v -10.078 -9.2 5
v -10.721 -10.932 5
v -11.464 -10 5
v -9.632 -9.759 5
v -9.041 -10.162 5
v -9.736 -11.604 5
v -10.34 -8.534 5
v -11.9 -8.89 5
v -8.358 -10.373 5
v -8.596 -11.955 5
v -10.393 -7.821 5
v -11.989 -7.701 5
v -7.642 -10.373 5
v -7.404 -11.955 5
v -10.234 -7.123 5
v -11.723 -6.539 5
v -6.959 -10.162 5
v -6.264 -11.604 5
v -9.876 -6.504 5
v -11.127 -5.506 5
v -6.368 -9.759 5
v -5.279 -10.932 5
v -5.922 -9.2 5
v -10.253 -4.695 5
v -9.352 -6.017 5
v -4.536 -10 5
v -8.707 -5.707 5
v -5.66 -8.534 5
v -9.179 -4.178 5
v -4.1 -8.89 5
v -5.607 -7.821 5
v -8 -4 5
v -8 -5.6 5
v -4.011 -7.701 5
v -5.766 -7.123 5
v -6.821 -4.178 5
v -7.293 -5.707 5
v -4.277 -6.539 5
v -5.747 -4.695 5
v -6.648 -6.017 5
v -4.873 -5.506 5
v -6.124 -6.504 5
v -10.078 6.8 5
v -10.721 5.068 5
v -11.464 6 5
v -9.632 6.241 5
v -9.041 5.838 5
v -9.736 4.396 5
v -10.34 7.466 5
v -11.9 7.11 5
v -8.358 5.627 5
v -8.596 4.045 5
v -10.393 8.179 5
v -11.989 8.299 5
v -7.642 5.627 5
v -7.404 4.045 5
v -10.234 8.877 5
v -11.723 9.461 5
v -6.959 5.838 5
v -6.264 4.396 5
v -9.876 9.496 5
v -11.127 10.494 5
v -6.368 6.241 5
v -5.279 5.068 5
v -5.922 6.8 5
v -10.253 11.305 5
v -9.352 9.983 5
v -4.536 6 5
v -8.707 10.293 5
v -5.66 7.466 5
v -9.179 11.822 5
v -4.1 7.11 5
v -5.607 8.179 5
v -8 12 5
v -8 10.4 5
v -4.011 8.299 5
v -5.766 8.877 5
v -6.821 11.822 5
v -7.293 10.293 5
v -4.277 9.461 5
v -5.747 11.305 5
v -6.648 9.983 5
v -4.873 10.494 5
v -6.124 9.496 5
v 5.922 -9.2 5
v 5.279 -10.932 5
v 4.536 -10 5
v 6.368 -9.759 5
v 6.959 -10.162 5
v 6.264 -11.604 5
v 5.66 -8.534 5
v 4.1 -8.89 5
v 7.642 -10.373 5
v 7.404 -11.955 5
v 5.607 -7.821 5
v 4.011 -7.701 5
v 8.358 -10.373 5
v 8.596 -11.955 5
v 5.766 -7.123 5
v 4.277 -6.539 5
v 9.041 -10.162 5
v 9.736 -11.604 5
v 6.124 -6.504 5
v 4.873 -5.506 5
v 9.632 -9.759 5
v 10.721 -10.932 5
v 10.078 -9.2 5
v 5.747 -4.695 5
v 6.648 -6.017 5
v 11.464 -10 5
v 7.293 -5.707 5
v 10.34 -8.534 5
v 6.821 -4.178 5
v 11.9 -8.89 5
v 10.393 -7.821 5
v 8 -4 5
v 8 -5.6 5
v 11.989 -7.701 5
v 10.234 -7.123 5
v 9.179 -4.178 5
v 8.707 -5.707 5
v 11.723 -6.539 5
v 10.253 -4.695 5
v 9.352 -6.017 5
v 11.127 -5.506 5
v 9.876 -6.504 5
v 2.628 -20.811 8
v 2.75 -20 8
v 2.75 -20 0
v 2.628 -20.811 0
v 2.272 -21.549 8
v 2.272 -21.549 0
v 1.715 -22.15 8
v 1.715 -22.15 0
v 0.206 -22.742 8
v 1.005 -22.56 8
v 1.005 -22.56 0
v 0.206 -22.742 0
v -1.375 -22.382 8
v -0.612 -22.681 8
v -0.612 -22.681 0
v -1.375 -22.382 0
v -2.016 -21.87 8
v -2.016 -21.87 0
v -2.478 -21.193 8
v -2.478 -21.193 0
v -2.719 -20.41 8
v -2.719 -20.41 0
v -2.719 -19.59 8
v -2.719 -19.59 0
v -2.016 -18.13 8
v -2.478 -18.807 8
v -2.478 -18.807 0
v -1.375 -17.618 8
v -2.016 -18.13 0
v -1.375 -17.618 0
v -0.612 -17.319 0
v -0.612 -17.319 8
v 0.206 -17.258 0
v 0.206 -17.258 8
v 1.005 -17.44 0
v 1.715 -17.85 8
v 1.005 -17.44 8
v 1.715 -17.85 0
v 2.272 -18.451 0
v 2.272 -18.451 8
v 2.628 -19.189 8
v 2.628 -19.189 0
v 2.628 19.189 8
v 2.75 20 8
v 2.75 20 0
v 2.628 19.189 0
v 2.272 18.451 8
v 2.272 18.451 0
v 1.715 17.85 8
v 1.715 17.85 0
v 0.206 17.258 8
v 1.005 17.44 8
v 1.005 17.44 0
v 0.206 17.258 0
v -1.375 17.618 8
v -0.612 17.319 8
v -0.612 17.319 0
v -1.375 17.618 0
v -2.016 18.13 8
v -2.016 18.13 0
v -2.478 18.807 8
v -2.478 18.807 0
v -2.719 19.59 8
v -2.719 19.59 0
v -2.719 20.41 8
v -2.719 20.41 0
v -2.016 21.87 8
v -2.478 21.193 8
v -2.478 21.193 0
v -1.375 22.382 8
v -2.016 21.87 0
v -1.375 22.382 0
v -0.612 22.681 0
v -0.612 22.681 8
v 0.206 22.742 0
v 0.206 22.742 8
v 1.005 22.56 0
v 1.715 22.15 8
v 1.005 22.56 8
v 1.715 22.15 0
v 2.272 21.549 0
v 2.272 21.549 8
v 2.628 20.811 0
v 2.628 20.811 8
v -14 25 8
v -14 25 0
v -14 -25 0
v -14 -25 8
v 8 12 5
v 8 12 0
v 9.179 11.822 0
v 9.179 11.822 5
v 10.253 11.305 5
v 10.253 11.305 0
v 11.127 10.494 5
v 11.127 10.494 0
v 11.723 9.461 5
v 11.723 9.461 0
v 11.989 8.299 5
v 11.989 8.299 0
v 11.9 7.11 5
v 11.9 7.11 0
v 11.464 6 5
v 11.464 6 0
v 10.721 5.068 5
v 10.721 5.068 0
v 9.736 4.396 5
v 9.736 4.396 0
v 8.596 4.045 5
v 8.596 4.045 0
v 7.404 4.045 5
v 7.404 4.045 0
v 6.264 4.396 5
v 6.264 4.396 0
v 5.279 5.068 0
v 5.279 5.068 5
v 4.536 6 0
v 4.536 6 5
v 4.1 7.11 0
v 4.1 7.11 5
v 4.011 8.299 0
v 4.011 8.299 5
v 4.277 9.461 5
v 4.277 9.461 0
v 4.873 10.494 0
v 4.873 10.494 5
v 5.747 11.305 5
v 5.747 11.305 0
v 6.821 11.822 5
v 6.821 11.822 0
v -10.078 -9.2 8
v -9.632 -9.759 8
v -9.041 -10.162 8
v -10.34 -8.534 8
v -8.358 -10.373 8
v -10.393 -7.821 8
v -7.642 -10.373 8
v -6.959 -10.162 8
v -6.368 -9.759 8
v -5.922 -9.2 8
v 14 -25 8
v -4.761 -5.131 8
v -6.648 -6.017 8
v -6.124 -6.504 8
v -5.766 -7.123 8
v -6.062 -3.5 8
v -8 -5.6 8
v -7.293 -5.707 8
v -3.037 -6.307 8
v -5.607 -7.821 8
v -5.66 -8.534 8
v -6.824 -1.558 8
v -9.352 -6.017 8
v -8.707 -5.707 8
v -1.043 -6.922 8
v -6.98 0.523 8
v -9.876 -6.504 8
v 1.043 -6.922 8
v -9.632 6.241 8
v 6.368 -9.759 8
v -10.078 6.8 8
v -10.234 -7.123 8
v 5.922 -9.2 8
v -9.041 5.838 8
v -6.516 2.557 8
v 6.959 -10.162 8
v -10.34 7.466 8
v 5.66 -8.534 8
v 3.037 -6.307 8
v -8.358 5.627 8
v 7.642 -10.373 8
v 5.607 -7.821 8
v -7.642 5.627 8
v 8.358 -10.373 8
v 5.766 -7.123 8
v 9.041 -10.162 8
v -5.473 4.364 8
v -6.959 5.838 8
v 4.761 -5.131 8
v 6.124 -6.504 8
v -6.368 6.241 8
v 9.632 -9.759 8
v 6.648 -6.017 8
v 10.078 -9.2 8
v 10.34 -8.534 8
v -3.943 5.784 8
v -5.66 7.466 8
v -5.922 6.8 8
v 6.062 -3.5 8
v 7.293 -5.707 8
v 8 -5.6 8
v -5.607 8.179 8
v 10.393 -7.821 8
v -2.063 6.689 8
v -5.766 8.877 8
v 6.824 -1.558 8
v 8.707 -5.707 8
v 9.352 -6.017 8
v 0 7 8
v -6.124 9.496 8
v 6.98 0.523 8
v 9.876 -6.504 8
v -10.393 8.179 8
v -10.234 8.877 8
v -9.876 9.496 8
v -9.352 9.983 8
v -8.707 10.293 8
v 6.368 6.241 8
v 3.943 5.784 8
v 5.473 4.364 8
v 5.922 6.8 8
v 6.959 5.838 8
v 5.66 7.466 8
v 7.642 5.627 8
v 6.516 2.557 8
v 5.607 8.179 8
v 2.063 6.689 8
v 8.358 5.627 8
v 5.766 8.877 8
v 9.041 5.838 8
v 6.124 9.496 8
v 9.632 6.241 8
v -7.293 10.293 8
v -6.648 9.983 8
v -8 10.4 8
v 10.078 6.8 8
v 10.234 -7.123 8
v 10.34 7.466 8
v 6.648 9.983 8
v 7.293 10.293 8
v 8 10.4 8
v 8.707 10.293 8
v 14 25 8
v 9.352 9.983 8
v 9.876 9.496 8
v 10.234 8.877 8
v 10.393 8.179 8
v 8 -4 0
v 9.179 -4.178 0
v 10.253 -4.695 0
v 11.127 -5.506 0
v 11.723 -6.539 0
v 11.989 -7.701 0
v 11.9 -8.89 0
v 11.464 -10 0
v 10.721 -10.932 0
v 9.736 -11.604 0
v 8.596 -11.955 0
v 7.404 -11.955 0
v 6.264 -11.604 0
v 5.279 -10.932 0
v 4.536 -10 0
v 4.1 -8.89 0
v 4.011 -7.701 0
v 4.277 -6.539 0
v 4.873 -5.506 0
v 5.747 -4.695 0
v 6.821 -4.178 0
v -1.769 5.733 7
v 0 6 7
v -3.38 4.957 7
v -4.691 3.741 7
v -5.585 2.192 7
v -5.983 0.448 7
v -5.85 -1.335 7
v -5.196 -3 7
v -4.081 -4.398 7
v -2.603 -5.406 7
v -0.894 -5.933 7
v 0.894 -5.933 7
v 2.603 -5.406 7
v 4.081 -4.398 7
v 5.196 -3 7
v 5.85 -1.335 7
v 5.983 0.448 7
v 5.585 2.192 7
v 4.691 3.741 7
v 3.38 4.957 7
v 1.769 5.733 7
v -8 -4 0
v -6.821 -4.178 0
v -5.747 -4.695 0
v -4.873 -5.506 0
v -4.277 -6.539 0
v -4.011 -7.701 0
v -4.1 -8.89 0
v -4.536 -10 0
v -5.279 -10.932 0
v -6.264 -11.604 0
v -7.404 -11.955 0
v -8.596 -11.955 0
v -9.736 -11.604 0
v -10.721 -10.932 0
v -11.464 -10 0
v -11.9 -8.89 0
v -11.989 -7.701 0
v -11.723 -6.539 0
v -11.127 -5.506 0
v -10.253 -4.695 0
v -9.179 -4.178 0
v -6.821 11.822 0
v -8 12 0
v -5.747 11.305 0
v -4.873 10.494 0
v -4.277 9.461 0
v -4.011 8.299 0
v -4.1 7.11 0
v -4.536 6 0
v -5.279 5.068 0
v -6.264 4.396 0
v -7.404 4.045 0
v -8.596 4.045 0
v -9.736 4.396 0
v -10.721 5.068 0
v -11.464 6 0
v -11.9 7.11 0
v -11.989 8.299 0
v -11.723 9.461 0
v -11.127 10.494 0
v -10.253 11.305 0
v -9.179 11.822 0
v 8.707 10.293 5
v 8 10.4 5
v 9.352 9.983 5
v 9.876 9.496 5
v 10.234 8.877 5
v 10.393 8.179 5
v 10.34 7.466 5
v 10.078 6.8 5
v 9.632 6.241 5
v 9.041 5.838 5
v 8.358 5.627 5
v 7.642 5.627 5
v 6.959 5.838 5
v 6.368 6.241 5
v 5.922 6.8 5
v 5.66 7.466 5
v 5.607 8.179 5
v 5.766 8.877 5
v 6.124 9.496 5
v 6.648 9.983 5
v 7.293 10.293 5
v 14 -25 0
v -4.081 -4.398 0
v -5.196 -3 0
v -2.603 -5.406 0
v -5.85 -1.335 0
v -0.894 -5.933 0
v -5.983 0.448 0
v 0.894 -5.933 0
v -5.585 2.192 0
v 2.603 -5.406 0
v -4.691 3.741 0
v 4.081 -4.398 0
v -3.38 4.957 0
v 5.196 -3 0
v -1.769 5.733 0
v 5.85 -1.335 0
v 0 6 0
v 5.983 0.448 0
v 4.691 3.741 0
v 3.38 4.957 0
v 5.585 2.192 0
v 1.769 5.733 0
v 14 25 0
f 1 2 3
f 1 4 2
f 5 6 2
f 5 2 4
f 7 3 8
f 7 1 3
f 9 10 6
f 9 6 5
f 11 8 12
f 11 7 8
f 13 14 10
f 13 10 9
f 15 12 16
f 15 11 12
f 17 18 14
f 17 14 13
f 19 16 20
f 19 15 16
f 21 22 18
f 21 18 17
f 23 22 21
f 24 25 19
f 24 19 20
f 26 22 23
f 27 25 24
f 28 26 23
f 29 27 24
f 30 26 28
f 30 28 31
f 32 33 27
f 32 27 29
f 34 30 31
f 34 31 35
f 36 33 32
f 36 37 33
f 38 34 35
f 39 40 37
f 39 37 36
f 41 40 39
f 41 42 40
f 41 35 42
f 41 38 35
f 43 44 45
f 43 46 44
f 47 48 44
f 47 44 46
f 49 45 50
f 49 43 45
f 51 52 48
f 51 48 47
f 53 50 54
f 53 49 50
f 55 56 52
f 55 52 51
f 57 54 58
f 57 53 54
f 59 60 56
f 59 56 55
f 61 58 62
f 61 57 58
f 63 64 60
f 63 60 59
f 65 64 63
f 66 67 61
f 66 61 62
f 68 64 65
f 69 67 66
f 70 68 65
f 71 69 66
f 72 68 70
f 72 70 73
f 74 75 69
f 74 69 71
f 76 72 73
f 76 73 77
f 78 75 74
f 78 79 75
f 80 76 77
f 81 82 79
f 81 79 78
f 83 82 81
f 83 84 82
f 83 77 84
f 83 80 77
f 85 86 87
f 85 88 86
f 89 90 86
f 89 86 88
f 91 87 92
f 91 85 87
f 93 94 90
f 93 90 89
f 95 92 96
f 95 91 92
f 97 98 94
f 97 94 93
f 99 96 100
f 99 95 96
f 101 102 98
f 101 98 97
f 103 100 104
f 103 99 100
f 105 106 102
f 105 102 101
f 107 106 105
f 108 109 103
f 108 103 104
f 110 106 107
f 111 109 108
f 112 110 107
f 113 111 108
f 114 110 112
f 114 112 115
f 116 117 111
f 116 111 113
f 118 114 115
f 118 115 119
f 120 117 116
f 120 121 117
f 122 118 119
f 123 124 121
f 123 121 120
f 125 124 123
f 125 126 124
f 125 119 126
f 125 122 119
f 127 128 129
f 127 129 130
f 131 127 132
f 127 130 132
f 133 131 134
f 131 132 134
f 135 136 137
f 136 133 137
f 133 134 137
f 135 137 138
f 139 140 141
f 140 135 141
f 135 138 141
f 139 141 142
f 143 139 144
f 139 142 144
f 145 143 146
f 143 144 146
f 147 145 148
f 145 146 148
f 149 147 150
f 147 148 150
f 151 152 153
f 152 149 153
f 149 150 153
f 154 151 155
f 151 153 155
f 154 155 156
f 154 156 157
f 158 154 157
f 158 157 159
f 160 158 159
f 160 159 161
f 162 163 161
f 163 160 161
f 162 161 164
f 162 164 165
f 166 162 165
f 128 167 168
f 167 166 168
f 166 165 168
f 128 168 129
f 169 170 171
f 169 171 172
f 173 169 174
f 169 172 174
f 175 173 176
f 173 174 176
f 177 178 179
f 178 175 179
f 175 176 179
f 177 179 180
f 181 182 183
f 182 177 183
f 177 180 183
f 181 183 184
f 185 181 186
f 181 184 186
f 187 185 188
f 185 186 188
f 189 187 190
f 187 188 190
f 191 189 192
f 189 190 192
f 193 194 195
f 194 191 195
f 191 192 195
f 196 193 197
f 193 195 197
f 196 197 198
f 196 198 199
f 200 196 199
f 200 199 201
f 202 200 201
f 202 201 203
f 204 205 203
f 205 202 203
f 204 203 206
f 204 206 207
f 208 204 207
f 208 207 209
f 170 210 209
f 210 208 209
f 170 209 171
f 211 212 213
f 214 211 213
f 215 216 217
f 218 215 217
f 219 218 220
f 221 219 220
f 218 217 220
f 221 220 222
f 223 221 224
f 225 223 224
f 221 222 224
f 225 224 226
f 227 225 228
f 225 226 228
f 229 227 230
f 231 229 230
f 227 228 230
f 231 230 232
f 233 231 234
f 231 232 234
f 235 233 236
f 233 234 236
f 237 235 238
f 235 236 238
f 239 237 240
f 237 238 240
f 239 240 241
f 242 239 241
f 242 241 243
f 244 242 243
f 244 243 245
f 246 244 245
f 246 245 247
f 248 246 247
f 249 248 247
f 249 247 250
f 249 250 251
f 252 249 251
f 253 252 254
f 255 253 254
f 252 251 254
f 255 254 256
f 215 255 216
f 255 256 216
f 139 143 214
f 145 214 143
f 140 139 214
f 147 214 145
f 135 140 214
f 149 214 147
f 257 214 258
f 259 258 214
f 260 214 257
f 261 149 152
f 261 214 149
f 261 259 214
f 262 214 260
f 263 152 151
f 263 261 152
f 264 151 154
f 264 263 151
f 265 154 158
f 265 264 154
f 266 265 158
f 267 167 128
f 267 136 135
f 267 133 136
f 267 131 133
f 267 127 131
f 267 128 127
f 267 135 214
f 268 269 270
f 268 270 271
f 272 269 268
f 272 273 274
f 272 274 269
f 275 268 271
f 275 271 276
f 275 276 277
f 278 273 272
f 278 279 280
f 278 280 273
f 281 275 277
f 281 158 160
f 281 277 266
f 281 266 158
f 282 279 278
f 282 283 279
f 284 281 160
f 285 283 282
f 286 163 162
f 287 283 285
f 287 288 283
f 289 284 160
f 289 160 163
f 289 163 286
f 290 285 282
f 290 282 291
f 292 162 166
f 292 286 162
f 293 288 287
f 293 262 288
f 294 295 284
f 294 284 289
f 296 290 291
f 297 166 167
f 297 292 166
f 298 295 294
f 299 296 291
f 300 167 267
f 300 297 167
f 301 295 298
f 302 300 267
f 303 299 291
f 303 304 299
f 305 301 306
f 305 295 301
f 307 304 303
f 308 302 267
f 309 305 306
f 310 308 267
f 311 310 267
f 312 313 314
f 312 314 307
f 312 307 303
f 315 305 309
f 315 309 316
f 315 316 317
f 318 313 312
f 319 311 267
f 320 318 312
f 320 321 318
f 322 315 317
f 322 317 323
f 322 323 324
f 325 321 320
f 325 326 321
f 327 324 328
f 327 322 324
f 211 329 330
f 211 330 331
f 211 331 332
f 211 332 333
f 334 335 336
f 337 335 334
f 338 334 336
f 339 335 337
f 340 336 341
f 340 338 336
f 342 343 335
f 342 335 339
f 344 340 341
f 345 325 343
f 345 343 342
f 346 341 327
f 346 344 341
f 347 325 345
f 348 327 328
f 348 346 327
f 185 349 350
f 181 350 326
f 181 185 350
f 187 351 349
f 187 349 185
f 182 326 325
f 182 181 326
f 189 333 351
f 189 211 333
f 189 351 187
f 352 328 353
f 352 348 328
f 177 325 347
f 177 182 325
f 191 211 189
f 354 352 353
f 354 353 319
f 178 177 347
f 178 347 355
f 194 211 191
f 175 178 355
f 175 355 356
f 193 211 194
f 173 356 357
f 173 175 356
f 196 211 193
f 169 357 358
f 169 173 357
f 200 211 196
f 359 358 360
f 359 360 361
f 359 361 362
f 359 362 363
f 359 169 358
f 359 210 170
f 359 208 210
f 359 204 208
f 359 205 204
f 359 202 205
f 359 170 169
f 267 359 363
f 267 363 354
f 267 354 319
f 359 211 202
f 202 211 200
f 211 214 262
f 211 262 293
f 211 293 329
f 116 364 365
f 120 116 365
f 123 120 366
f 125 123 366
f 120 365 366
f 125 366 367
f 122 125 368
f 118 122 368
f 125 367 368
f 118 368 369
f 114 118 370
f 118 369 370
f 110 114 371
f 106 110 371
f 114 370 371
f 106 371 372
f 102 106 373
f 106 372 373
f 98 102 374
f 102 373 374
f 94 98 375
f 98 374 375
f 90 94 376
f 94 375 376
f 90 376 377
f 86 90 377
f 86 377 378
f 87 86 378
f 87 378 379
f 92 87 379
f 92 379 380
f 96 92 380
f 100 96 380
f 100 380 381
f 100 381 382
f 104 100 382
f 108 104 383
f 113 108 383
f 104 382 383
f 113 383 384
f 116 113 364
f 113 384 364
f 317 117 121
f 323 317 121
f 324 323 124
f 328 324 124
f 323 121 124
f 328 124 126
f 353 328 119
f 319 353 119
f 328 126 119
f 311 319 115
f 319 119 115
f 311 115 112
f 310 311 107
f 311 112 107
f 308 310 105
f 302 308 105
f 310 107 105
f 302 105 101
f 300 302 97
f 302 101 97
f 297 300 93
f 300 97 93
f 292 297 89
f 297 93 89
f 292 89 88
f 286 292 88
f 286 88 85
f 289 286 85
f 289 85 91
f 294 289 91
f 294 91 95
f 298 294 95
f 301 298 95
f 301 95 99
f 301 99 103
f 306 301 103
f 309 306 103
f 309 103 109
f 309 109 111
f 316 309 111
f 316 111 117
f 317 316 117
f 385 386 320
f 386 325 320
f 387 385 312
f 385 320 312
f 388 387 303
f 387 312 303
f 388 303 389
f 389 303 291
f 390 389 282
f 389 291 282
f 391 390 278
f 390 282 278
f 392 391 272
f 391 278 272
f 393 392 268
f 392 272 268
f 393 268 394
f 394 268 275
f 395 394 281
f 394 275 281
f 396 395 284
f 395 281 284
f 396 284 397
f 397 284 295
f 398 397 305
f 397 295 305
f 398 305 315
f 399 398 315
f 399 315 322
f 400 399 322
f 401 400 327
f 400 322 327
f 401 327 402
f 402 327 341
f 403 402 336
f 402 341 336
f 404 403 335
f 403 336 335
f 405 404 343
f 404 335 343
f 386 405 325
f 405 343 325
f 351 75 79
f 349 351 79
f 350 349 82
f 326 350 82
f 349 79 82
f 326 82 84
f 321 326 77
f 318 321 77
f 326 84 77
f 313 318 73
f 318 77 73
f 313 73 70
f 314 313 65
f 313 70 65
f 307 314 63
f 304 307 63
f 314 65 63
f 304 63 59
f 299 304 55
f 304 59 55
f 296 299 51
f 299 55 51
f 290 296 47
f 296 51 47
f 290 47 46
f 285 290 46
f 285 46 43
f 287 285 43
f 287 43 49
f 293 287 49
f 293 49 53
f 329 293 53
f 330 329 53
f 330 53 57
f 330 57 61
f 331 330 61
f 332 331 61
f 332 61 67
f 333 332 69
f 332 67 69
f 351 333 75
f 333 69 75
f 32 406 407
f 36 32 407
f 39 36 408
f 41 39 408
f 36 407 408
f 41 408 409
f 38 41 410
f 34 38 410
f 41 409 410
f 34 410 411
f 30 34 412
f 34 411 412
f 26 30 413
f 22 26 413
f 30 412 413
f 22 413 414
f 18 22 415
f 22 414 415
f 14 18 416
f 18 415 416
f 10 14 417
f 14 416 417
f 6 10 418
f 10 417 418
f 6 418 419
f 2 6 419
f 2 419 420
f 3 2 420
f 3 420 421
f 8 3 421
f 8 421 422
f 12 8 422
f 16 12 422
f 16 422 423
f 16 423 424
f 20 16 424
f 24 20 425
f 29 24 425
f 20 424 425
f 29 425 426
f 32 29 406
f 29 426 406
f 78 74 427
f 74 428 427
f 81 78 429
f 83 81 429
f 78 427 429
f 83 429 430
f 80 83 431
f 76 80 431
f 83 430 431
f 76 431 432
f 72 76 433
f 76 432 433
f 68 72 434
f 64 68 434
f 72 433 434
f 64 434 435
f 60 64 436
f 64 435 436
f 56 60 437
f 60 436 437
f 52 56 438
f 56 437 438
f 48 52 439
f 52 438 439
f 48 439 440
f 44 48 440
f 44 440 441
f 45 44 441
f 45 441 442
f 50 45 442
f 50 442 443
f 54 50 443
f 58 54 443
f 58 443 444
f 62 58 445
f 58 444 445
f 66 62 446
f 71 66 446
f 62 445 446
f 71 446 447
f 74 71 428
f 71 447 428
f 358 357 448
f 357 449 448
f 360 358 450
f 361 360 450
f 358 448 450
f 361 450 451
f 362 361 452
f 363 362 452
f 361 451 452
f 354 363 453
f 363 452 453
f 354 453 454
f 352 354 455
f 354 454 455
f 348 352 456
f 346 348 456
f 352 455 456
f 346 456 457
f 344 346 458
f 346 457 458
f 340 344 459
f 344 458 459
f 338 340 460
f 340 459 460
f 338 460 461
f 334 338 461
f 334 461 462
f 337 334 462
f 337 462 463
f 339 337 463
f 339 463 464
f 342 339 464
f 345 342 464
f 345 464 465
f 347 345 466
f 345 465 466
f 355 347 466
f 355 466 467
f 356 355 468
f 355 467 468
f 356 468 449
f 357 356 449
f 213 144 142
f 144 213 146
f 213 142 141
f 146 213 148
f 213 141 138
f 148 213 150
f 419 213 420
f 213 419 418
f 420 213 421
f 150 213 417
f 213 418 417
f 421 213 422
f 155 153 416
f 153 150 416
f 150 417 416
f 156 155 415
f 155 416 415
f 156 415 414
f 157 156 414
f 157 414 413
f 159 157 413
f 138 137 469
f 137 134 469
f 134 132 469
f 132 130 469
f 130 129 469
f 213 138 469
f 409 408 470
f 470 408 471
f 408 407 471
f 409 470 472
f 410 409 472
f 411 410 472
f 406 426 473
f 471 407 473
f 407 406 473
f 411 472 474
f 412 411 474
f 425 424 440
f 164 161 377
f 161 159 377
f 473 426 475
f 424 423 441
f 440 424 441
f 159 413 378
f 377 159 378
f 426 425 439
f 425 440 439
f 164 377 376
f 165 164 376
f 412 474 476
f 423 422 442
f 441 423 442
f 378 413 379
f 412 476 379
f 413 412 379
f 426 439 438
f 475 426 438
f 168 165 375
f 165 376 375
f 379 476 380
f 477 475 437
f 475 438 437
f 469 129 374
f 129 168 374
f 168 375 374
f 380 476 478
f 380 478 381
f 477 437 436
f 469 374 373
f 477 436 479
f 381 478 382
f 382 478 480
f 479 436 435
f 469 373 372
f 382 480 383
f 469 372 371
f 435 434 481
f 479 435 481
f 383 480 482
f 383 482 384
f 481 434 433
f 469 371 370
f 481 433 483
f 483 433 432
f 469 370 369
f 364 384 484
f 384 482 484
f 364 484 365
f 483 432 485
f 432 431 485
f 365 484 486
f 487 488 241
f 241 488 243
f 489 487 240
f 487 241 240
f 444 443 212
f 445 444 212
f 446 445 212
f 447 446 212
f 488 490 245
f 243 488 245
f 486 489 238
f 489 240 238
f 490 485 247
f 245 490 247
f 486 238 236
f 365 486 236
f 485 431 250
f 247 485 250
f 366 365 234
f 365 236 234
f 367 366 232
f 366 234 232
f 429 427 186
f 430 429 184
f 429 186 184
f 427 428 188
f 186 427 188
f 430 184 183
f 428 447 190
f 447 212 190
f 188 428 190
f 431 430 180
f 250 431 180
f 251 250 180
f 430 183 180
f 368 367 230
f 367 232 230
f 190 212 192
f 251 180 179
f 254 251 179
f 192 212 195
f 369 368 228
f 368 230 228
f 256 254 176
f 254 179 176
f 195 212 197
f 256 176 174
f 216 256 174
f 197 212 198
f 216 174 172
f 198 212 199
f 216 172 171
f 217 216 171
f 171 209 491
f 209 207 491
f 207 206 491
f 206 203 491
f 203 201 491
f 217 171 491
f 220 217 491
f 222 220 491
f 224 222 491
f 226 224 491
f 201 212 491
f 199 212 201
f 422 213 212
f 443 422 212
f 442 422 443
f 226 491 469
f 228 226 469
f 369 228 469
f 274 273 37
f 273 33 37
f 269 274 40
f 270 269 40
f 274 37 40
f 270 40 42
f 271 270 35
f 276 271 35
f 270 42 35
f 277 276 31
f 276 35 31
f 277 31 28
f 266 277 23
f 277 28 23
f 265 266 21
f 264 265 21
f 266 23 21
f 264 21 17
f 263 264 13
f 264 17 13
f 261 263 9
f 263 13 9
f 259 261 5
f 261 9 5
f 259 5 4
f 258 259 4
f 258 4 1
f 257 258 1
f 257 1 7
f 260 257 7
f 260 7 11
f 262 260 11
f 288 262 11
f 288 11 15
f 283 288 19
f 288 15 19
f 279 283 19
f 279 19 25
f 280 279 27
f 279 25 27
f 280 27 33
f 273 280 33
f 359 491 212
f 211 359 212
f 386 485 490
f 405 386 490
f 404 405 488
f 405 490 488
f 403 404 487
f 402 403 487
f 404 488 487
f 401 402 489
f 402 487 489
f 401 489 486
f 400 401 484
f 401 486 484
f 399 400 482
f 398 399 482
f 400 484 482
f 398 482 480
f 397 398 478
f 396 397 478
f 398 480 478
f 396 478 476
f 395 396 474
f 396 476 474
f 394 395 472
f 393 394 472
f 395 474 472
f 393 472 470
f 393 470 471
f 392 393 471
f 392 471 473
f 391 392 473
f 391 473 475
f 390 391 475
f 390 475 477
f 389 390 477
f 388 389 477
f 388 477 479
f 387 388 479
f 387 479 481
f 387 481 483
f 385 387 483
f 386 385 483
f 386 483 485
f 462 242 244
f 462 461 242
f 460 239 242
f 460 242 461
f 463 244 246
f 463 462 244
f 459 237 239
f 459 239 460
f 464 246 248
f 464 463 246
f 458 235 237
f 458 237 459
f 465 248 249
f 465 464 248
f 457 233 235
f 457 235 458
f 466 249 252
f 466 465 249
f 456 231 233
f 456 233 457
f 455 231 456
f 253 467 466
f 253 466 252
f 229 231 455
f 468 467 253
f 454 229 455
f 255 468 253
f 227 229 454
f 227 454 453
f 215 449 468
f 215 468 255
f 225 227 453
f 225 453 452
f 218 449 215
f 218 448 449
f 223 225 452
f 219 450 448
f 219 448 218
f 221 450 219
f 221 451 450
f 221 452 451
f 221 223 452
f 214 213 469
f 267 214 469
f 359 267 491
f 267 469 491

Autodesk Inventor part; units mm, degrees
sketch "Skizze_1" plane through (0, 0, 0) normal (0, 0, 1) x (1, 0, 0)
  line L0 (-14, 25) -> (-14, -25)
  line L1 (-14, -25) -> (14, -25)
  line L2 (14, -25) -> (14, 25)
  line L3 (14, 25) -> (-14, 25)
  circle A0 centre (0, 20) radius 2.75
  circle A1 centre (0, -20) radius 2.75
extrude "Extrusion1" add sketch "Skizze_1" along normal blind 8
sketch "Skizze_2_ALT_Drilling_1" plane through (0, 0, 0) normal (1, 0, 0) x (0, 1, 0)
  line L0 (0, 0) -> (0, 8)
  line L1 (0, 8) -> (7, 8)
  line L2 (7, 8) -> (6, 7)
  line L3 (6, 7) -> (6, 0)
  line L4 (6, 0) -> (0, 0)
  line L5 (0, 0) -> (0, 8)
revolve "Revolution1" cut sketch "Skizze_2_ALT_Drilling_1" angle 360 about axis through (0, 0, 0) along (0, 0, -1)
sketch "Skizze_3_ALT_Drilling_2" plane through (8, 0, 0) normal (1, 0, 0) x (0, 0, -1)
  line L0 (0, 8) -> (-8, 8)
  line L1 (-8, 8) -> (-8, 10.4)
  line L2 (-8, 10.4) -> (-5, 10.4)
  line L3 (-5, 10.4) -> (-5, 12)
  line L4 (-5, 12) -> (0, 12)
  line L5 (0, 12) -> (0, 8)
  line L6 (0, 8) -> (-8, 8)
revolve "Revolution2" cut sketch "Skizze_3_ALT_Drilling_2" angle 360 about axis through (8, 8, 0) along (0, 0, -1)
sketch "Muster_1_SKETCH_1" plane through (-8, 0, 0) normal (1, 0, 0) x (0, 0, -1)
  line L0 (0, 8) -> (-8, 8)
  line L1 (-8, 8) -> (-8, 10.4)
  line L2 (-8, 10.4) -> (-5, 10.4)
  line L3 (-5, 10.4) -> (-5, 12)
  line L4 (-5, 12) -> (0, 12)
  line L5 (0, 12) -> (0, 8)
  line L6 (0, 8) -> (-8, 8)
sketch "Muster_1_SKETCH_2" plane through (8, 0, 0) normal (1, 0, 0) x (0, 0, -1)
  line L0 (0, -8) -> (-8, -8)
  line L1 (-8, -8) -> (-8, -5.6)
  line L2 (-8, -5.6) -> (-5, -5.6)
  line L3 (-5, -5.6) -> (-5, -4)
  line L4 (-5, -4) -> (0, -4)
  line L5 (0, -4) -> (0, -8)
  line L6 (0, -8) -> (-8, -8)
sketch "Muster_1_SKETCH_3" plane through (-8, 0, 0) normal (1, 0, 0) x (0, 0, -1)
  line L0 (0, -8) -> (-8, -8)
  line L1 (-8, -8) -> (-8, -5.6)
  line L2 (-8, -5.6) -> (-5, -5.6)
  line L3 (-5, -5.6) -> (-5, -4)
  line L4 (-5, -4) -> (0, -4)
  line L5 (0, -4) -> (0, -8)
  line L6 (0, -8) -> (-8, -8)
revolve "Revolution3" cut sketch "Muster_1_SKETCH_1" angle 360 about axis through (-8, 8, 0) along (0, 0, -1)
revolve "Revolution4" cut sketch "Muster_1_SKETCH_2" angle 360 about axis through (8, -8, 0) along (0, 0, -1)
revolve "Revolution5" cut sketch "Muster_1_SKETCH_3" angle 360 about axis through (-8, -8, 0) along (0, 0, -1)
ref_plane "FDT_MOUNT_XY" through (0, 0, 8) normal (0, 0, 1) x (0, 1, 0)
ref_plane "FDT_MOUNT_YZ" through (0, 0, 8) normal (0, 1, 0) x (-1, 0, 0)
ref_plane "FDT_MOUNT_ZX" through (0, 0, 8) normal (-1, 0, 0) x (0, 0, 1)
ref_plane "FNC_1_XY" through (0, 0, 4) normal (0, 0, 1) x (1, 0, 0)
ref_plane "FNC_1_YZ" through (0, 0, 4) normal (1, 0, 0) x (0, 1, 0)
ref_plane "FNC_1_ZX" through (0, 0, 4) normal (0, 1, 0) x (0, 0, 1)
ref_plane "FNC_2_3_XY" through (0, 0, 8) normal (0, 0, 1) x (1, 0, 0)
ref_plane "FNC_2_3_YZ" through (0, 0, 8) normal (1, 0, 0) x (0, 1, 0)
ref_plane "FNC_2_3_ZX" through (0, 0, 8) normal (0, 1, 0) x (0, 0, 1)
ref_plane "FNC_Schraube_1_XY" through (-8, 8, 5) normal (0, 0, 1) x (1, 0, 0)
ref_plane "FNC_Schraube_1_YZ" through (-8, 8, 5) normal (1, 0, 0) x (0, 1, 0)
ref_plane "FNC_Schraube_1_ZX" through (-8, 8, 5) normal (0, 1, 0) x (0, 0, 1)
ref_plane "FNC_Schraube_2_XY" through (8, 8, 5) normal (0, 0, 1) x (1, 0, 0)
ref_plane "FNC_Schraube_2_YZ" through (8, 8, 5) normal (1, 0, 0) x (0, 1, 0)
ref_plane "FNC_Schraube_2_ZX" through (8, 8, 5) normal (0, 1, 0) x (0, 0, 1)
ref_plane "FNC_Schraube_3_XY" through (-8, -8, 5) normal (0, 0, 1) x (1, 0, 0)
ref_plane "FNC_Schraube_3_YZ" through (-8, -8, 5) normal (1, 0, 0) x (0, 1, 0)
ref_plane "FNC_Schraube_3_ZX" through (-8, -8, 5) normal (0, 1, 0) x (0, 0, 1)
ref_plane "FNC_Schraube_4_XY" through (8, -8, 5) normal (0, 0, 1) x (1, 0, 0)
ref_plane "FNC_Schraube_4_YZ" through (8, -8, 5) normal (1, 0, 0) x (0, 1, 0)
ref_plane "FNC_Schraube_4_ZX" through (8, -8, 5) normal (0, 1, 0) x (0, 0, 1)
ref_plane "P17_1_XY" through (0, 20, 8) normal (0, 0, 1) x (1, 0, 0)
ref_plane "P17_1_YZ" through (0, 20, 8) normal (1, 0, 0) x (0, 1, 0)
ref_plane "P17_1_ZX" through (0, 20, 8) normal (0, 1, 0) x (0, 0, 1)
ref_plane "P18_1_XY" through (0, -20, 8) normal (0, 0, 1) x (1, 0, 0)
ref_plane "P18_1_YZ" through (0, -20, 8) normal (1, 0, 0) x (0, 1, 0)
ref_plane "P18_1_ZX" through (0, -20, 8) normal (0, 1, 0) x (0, 0, 1)
properties part number "537245 FNC-12---(F)"
